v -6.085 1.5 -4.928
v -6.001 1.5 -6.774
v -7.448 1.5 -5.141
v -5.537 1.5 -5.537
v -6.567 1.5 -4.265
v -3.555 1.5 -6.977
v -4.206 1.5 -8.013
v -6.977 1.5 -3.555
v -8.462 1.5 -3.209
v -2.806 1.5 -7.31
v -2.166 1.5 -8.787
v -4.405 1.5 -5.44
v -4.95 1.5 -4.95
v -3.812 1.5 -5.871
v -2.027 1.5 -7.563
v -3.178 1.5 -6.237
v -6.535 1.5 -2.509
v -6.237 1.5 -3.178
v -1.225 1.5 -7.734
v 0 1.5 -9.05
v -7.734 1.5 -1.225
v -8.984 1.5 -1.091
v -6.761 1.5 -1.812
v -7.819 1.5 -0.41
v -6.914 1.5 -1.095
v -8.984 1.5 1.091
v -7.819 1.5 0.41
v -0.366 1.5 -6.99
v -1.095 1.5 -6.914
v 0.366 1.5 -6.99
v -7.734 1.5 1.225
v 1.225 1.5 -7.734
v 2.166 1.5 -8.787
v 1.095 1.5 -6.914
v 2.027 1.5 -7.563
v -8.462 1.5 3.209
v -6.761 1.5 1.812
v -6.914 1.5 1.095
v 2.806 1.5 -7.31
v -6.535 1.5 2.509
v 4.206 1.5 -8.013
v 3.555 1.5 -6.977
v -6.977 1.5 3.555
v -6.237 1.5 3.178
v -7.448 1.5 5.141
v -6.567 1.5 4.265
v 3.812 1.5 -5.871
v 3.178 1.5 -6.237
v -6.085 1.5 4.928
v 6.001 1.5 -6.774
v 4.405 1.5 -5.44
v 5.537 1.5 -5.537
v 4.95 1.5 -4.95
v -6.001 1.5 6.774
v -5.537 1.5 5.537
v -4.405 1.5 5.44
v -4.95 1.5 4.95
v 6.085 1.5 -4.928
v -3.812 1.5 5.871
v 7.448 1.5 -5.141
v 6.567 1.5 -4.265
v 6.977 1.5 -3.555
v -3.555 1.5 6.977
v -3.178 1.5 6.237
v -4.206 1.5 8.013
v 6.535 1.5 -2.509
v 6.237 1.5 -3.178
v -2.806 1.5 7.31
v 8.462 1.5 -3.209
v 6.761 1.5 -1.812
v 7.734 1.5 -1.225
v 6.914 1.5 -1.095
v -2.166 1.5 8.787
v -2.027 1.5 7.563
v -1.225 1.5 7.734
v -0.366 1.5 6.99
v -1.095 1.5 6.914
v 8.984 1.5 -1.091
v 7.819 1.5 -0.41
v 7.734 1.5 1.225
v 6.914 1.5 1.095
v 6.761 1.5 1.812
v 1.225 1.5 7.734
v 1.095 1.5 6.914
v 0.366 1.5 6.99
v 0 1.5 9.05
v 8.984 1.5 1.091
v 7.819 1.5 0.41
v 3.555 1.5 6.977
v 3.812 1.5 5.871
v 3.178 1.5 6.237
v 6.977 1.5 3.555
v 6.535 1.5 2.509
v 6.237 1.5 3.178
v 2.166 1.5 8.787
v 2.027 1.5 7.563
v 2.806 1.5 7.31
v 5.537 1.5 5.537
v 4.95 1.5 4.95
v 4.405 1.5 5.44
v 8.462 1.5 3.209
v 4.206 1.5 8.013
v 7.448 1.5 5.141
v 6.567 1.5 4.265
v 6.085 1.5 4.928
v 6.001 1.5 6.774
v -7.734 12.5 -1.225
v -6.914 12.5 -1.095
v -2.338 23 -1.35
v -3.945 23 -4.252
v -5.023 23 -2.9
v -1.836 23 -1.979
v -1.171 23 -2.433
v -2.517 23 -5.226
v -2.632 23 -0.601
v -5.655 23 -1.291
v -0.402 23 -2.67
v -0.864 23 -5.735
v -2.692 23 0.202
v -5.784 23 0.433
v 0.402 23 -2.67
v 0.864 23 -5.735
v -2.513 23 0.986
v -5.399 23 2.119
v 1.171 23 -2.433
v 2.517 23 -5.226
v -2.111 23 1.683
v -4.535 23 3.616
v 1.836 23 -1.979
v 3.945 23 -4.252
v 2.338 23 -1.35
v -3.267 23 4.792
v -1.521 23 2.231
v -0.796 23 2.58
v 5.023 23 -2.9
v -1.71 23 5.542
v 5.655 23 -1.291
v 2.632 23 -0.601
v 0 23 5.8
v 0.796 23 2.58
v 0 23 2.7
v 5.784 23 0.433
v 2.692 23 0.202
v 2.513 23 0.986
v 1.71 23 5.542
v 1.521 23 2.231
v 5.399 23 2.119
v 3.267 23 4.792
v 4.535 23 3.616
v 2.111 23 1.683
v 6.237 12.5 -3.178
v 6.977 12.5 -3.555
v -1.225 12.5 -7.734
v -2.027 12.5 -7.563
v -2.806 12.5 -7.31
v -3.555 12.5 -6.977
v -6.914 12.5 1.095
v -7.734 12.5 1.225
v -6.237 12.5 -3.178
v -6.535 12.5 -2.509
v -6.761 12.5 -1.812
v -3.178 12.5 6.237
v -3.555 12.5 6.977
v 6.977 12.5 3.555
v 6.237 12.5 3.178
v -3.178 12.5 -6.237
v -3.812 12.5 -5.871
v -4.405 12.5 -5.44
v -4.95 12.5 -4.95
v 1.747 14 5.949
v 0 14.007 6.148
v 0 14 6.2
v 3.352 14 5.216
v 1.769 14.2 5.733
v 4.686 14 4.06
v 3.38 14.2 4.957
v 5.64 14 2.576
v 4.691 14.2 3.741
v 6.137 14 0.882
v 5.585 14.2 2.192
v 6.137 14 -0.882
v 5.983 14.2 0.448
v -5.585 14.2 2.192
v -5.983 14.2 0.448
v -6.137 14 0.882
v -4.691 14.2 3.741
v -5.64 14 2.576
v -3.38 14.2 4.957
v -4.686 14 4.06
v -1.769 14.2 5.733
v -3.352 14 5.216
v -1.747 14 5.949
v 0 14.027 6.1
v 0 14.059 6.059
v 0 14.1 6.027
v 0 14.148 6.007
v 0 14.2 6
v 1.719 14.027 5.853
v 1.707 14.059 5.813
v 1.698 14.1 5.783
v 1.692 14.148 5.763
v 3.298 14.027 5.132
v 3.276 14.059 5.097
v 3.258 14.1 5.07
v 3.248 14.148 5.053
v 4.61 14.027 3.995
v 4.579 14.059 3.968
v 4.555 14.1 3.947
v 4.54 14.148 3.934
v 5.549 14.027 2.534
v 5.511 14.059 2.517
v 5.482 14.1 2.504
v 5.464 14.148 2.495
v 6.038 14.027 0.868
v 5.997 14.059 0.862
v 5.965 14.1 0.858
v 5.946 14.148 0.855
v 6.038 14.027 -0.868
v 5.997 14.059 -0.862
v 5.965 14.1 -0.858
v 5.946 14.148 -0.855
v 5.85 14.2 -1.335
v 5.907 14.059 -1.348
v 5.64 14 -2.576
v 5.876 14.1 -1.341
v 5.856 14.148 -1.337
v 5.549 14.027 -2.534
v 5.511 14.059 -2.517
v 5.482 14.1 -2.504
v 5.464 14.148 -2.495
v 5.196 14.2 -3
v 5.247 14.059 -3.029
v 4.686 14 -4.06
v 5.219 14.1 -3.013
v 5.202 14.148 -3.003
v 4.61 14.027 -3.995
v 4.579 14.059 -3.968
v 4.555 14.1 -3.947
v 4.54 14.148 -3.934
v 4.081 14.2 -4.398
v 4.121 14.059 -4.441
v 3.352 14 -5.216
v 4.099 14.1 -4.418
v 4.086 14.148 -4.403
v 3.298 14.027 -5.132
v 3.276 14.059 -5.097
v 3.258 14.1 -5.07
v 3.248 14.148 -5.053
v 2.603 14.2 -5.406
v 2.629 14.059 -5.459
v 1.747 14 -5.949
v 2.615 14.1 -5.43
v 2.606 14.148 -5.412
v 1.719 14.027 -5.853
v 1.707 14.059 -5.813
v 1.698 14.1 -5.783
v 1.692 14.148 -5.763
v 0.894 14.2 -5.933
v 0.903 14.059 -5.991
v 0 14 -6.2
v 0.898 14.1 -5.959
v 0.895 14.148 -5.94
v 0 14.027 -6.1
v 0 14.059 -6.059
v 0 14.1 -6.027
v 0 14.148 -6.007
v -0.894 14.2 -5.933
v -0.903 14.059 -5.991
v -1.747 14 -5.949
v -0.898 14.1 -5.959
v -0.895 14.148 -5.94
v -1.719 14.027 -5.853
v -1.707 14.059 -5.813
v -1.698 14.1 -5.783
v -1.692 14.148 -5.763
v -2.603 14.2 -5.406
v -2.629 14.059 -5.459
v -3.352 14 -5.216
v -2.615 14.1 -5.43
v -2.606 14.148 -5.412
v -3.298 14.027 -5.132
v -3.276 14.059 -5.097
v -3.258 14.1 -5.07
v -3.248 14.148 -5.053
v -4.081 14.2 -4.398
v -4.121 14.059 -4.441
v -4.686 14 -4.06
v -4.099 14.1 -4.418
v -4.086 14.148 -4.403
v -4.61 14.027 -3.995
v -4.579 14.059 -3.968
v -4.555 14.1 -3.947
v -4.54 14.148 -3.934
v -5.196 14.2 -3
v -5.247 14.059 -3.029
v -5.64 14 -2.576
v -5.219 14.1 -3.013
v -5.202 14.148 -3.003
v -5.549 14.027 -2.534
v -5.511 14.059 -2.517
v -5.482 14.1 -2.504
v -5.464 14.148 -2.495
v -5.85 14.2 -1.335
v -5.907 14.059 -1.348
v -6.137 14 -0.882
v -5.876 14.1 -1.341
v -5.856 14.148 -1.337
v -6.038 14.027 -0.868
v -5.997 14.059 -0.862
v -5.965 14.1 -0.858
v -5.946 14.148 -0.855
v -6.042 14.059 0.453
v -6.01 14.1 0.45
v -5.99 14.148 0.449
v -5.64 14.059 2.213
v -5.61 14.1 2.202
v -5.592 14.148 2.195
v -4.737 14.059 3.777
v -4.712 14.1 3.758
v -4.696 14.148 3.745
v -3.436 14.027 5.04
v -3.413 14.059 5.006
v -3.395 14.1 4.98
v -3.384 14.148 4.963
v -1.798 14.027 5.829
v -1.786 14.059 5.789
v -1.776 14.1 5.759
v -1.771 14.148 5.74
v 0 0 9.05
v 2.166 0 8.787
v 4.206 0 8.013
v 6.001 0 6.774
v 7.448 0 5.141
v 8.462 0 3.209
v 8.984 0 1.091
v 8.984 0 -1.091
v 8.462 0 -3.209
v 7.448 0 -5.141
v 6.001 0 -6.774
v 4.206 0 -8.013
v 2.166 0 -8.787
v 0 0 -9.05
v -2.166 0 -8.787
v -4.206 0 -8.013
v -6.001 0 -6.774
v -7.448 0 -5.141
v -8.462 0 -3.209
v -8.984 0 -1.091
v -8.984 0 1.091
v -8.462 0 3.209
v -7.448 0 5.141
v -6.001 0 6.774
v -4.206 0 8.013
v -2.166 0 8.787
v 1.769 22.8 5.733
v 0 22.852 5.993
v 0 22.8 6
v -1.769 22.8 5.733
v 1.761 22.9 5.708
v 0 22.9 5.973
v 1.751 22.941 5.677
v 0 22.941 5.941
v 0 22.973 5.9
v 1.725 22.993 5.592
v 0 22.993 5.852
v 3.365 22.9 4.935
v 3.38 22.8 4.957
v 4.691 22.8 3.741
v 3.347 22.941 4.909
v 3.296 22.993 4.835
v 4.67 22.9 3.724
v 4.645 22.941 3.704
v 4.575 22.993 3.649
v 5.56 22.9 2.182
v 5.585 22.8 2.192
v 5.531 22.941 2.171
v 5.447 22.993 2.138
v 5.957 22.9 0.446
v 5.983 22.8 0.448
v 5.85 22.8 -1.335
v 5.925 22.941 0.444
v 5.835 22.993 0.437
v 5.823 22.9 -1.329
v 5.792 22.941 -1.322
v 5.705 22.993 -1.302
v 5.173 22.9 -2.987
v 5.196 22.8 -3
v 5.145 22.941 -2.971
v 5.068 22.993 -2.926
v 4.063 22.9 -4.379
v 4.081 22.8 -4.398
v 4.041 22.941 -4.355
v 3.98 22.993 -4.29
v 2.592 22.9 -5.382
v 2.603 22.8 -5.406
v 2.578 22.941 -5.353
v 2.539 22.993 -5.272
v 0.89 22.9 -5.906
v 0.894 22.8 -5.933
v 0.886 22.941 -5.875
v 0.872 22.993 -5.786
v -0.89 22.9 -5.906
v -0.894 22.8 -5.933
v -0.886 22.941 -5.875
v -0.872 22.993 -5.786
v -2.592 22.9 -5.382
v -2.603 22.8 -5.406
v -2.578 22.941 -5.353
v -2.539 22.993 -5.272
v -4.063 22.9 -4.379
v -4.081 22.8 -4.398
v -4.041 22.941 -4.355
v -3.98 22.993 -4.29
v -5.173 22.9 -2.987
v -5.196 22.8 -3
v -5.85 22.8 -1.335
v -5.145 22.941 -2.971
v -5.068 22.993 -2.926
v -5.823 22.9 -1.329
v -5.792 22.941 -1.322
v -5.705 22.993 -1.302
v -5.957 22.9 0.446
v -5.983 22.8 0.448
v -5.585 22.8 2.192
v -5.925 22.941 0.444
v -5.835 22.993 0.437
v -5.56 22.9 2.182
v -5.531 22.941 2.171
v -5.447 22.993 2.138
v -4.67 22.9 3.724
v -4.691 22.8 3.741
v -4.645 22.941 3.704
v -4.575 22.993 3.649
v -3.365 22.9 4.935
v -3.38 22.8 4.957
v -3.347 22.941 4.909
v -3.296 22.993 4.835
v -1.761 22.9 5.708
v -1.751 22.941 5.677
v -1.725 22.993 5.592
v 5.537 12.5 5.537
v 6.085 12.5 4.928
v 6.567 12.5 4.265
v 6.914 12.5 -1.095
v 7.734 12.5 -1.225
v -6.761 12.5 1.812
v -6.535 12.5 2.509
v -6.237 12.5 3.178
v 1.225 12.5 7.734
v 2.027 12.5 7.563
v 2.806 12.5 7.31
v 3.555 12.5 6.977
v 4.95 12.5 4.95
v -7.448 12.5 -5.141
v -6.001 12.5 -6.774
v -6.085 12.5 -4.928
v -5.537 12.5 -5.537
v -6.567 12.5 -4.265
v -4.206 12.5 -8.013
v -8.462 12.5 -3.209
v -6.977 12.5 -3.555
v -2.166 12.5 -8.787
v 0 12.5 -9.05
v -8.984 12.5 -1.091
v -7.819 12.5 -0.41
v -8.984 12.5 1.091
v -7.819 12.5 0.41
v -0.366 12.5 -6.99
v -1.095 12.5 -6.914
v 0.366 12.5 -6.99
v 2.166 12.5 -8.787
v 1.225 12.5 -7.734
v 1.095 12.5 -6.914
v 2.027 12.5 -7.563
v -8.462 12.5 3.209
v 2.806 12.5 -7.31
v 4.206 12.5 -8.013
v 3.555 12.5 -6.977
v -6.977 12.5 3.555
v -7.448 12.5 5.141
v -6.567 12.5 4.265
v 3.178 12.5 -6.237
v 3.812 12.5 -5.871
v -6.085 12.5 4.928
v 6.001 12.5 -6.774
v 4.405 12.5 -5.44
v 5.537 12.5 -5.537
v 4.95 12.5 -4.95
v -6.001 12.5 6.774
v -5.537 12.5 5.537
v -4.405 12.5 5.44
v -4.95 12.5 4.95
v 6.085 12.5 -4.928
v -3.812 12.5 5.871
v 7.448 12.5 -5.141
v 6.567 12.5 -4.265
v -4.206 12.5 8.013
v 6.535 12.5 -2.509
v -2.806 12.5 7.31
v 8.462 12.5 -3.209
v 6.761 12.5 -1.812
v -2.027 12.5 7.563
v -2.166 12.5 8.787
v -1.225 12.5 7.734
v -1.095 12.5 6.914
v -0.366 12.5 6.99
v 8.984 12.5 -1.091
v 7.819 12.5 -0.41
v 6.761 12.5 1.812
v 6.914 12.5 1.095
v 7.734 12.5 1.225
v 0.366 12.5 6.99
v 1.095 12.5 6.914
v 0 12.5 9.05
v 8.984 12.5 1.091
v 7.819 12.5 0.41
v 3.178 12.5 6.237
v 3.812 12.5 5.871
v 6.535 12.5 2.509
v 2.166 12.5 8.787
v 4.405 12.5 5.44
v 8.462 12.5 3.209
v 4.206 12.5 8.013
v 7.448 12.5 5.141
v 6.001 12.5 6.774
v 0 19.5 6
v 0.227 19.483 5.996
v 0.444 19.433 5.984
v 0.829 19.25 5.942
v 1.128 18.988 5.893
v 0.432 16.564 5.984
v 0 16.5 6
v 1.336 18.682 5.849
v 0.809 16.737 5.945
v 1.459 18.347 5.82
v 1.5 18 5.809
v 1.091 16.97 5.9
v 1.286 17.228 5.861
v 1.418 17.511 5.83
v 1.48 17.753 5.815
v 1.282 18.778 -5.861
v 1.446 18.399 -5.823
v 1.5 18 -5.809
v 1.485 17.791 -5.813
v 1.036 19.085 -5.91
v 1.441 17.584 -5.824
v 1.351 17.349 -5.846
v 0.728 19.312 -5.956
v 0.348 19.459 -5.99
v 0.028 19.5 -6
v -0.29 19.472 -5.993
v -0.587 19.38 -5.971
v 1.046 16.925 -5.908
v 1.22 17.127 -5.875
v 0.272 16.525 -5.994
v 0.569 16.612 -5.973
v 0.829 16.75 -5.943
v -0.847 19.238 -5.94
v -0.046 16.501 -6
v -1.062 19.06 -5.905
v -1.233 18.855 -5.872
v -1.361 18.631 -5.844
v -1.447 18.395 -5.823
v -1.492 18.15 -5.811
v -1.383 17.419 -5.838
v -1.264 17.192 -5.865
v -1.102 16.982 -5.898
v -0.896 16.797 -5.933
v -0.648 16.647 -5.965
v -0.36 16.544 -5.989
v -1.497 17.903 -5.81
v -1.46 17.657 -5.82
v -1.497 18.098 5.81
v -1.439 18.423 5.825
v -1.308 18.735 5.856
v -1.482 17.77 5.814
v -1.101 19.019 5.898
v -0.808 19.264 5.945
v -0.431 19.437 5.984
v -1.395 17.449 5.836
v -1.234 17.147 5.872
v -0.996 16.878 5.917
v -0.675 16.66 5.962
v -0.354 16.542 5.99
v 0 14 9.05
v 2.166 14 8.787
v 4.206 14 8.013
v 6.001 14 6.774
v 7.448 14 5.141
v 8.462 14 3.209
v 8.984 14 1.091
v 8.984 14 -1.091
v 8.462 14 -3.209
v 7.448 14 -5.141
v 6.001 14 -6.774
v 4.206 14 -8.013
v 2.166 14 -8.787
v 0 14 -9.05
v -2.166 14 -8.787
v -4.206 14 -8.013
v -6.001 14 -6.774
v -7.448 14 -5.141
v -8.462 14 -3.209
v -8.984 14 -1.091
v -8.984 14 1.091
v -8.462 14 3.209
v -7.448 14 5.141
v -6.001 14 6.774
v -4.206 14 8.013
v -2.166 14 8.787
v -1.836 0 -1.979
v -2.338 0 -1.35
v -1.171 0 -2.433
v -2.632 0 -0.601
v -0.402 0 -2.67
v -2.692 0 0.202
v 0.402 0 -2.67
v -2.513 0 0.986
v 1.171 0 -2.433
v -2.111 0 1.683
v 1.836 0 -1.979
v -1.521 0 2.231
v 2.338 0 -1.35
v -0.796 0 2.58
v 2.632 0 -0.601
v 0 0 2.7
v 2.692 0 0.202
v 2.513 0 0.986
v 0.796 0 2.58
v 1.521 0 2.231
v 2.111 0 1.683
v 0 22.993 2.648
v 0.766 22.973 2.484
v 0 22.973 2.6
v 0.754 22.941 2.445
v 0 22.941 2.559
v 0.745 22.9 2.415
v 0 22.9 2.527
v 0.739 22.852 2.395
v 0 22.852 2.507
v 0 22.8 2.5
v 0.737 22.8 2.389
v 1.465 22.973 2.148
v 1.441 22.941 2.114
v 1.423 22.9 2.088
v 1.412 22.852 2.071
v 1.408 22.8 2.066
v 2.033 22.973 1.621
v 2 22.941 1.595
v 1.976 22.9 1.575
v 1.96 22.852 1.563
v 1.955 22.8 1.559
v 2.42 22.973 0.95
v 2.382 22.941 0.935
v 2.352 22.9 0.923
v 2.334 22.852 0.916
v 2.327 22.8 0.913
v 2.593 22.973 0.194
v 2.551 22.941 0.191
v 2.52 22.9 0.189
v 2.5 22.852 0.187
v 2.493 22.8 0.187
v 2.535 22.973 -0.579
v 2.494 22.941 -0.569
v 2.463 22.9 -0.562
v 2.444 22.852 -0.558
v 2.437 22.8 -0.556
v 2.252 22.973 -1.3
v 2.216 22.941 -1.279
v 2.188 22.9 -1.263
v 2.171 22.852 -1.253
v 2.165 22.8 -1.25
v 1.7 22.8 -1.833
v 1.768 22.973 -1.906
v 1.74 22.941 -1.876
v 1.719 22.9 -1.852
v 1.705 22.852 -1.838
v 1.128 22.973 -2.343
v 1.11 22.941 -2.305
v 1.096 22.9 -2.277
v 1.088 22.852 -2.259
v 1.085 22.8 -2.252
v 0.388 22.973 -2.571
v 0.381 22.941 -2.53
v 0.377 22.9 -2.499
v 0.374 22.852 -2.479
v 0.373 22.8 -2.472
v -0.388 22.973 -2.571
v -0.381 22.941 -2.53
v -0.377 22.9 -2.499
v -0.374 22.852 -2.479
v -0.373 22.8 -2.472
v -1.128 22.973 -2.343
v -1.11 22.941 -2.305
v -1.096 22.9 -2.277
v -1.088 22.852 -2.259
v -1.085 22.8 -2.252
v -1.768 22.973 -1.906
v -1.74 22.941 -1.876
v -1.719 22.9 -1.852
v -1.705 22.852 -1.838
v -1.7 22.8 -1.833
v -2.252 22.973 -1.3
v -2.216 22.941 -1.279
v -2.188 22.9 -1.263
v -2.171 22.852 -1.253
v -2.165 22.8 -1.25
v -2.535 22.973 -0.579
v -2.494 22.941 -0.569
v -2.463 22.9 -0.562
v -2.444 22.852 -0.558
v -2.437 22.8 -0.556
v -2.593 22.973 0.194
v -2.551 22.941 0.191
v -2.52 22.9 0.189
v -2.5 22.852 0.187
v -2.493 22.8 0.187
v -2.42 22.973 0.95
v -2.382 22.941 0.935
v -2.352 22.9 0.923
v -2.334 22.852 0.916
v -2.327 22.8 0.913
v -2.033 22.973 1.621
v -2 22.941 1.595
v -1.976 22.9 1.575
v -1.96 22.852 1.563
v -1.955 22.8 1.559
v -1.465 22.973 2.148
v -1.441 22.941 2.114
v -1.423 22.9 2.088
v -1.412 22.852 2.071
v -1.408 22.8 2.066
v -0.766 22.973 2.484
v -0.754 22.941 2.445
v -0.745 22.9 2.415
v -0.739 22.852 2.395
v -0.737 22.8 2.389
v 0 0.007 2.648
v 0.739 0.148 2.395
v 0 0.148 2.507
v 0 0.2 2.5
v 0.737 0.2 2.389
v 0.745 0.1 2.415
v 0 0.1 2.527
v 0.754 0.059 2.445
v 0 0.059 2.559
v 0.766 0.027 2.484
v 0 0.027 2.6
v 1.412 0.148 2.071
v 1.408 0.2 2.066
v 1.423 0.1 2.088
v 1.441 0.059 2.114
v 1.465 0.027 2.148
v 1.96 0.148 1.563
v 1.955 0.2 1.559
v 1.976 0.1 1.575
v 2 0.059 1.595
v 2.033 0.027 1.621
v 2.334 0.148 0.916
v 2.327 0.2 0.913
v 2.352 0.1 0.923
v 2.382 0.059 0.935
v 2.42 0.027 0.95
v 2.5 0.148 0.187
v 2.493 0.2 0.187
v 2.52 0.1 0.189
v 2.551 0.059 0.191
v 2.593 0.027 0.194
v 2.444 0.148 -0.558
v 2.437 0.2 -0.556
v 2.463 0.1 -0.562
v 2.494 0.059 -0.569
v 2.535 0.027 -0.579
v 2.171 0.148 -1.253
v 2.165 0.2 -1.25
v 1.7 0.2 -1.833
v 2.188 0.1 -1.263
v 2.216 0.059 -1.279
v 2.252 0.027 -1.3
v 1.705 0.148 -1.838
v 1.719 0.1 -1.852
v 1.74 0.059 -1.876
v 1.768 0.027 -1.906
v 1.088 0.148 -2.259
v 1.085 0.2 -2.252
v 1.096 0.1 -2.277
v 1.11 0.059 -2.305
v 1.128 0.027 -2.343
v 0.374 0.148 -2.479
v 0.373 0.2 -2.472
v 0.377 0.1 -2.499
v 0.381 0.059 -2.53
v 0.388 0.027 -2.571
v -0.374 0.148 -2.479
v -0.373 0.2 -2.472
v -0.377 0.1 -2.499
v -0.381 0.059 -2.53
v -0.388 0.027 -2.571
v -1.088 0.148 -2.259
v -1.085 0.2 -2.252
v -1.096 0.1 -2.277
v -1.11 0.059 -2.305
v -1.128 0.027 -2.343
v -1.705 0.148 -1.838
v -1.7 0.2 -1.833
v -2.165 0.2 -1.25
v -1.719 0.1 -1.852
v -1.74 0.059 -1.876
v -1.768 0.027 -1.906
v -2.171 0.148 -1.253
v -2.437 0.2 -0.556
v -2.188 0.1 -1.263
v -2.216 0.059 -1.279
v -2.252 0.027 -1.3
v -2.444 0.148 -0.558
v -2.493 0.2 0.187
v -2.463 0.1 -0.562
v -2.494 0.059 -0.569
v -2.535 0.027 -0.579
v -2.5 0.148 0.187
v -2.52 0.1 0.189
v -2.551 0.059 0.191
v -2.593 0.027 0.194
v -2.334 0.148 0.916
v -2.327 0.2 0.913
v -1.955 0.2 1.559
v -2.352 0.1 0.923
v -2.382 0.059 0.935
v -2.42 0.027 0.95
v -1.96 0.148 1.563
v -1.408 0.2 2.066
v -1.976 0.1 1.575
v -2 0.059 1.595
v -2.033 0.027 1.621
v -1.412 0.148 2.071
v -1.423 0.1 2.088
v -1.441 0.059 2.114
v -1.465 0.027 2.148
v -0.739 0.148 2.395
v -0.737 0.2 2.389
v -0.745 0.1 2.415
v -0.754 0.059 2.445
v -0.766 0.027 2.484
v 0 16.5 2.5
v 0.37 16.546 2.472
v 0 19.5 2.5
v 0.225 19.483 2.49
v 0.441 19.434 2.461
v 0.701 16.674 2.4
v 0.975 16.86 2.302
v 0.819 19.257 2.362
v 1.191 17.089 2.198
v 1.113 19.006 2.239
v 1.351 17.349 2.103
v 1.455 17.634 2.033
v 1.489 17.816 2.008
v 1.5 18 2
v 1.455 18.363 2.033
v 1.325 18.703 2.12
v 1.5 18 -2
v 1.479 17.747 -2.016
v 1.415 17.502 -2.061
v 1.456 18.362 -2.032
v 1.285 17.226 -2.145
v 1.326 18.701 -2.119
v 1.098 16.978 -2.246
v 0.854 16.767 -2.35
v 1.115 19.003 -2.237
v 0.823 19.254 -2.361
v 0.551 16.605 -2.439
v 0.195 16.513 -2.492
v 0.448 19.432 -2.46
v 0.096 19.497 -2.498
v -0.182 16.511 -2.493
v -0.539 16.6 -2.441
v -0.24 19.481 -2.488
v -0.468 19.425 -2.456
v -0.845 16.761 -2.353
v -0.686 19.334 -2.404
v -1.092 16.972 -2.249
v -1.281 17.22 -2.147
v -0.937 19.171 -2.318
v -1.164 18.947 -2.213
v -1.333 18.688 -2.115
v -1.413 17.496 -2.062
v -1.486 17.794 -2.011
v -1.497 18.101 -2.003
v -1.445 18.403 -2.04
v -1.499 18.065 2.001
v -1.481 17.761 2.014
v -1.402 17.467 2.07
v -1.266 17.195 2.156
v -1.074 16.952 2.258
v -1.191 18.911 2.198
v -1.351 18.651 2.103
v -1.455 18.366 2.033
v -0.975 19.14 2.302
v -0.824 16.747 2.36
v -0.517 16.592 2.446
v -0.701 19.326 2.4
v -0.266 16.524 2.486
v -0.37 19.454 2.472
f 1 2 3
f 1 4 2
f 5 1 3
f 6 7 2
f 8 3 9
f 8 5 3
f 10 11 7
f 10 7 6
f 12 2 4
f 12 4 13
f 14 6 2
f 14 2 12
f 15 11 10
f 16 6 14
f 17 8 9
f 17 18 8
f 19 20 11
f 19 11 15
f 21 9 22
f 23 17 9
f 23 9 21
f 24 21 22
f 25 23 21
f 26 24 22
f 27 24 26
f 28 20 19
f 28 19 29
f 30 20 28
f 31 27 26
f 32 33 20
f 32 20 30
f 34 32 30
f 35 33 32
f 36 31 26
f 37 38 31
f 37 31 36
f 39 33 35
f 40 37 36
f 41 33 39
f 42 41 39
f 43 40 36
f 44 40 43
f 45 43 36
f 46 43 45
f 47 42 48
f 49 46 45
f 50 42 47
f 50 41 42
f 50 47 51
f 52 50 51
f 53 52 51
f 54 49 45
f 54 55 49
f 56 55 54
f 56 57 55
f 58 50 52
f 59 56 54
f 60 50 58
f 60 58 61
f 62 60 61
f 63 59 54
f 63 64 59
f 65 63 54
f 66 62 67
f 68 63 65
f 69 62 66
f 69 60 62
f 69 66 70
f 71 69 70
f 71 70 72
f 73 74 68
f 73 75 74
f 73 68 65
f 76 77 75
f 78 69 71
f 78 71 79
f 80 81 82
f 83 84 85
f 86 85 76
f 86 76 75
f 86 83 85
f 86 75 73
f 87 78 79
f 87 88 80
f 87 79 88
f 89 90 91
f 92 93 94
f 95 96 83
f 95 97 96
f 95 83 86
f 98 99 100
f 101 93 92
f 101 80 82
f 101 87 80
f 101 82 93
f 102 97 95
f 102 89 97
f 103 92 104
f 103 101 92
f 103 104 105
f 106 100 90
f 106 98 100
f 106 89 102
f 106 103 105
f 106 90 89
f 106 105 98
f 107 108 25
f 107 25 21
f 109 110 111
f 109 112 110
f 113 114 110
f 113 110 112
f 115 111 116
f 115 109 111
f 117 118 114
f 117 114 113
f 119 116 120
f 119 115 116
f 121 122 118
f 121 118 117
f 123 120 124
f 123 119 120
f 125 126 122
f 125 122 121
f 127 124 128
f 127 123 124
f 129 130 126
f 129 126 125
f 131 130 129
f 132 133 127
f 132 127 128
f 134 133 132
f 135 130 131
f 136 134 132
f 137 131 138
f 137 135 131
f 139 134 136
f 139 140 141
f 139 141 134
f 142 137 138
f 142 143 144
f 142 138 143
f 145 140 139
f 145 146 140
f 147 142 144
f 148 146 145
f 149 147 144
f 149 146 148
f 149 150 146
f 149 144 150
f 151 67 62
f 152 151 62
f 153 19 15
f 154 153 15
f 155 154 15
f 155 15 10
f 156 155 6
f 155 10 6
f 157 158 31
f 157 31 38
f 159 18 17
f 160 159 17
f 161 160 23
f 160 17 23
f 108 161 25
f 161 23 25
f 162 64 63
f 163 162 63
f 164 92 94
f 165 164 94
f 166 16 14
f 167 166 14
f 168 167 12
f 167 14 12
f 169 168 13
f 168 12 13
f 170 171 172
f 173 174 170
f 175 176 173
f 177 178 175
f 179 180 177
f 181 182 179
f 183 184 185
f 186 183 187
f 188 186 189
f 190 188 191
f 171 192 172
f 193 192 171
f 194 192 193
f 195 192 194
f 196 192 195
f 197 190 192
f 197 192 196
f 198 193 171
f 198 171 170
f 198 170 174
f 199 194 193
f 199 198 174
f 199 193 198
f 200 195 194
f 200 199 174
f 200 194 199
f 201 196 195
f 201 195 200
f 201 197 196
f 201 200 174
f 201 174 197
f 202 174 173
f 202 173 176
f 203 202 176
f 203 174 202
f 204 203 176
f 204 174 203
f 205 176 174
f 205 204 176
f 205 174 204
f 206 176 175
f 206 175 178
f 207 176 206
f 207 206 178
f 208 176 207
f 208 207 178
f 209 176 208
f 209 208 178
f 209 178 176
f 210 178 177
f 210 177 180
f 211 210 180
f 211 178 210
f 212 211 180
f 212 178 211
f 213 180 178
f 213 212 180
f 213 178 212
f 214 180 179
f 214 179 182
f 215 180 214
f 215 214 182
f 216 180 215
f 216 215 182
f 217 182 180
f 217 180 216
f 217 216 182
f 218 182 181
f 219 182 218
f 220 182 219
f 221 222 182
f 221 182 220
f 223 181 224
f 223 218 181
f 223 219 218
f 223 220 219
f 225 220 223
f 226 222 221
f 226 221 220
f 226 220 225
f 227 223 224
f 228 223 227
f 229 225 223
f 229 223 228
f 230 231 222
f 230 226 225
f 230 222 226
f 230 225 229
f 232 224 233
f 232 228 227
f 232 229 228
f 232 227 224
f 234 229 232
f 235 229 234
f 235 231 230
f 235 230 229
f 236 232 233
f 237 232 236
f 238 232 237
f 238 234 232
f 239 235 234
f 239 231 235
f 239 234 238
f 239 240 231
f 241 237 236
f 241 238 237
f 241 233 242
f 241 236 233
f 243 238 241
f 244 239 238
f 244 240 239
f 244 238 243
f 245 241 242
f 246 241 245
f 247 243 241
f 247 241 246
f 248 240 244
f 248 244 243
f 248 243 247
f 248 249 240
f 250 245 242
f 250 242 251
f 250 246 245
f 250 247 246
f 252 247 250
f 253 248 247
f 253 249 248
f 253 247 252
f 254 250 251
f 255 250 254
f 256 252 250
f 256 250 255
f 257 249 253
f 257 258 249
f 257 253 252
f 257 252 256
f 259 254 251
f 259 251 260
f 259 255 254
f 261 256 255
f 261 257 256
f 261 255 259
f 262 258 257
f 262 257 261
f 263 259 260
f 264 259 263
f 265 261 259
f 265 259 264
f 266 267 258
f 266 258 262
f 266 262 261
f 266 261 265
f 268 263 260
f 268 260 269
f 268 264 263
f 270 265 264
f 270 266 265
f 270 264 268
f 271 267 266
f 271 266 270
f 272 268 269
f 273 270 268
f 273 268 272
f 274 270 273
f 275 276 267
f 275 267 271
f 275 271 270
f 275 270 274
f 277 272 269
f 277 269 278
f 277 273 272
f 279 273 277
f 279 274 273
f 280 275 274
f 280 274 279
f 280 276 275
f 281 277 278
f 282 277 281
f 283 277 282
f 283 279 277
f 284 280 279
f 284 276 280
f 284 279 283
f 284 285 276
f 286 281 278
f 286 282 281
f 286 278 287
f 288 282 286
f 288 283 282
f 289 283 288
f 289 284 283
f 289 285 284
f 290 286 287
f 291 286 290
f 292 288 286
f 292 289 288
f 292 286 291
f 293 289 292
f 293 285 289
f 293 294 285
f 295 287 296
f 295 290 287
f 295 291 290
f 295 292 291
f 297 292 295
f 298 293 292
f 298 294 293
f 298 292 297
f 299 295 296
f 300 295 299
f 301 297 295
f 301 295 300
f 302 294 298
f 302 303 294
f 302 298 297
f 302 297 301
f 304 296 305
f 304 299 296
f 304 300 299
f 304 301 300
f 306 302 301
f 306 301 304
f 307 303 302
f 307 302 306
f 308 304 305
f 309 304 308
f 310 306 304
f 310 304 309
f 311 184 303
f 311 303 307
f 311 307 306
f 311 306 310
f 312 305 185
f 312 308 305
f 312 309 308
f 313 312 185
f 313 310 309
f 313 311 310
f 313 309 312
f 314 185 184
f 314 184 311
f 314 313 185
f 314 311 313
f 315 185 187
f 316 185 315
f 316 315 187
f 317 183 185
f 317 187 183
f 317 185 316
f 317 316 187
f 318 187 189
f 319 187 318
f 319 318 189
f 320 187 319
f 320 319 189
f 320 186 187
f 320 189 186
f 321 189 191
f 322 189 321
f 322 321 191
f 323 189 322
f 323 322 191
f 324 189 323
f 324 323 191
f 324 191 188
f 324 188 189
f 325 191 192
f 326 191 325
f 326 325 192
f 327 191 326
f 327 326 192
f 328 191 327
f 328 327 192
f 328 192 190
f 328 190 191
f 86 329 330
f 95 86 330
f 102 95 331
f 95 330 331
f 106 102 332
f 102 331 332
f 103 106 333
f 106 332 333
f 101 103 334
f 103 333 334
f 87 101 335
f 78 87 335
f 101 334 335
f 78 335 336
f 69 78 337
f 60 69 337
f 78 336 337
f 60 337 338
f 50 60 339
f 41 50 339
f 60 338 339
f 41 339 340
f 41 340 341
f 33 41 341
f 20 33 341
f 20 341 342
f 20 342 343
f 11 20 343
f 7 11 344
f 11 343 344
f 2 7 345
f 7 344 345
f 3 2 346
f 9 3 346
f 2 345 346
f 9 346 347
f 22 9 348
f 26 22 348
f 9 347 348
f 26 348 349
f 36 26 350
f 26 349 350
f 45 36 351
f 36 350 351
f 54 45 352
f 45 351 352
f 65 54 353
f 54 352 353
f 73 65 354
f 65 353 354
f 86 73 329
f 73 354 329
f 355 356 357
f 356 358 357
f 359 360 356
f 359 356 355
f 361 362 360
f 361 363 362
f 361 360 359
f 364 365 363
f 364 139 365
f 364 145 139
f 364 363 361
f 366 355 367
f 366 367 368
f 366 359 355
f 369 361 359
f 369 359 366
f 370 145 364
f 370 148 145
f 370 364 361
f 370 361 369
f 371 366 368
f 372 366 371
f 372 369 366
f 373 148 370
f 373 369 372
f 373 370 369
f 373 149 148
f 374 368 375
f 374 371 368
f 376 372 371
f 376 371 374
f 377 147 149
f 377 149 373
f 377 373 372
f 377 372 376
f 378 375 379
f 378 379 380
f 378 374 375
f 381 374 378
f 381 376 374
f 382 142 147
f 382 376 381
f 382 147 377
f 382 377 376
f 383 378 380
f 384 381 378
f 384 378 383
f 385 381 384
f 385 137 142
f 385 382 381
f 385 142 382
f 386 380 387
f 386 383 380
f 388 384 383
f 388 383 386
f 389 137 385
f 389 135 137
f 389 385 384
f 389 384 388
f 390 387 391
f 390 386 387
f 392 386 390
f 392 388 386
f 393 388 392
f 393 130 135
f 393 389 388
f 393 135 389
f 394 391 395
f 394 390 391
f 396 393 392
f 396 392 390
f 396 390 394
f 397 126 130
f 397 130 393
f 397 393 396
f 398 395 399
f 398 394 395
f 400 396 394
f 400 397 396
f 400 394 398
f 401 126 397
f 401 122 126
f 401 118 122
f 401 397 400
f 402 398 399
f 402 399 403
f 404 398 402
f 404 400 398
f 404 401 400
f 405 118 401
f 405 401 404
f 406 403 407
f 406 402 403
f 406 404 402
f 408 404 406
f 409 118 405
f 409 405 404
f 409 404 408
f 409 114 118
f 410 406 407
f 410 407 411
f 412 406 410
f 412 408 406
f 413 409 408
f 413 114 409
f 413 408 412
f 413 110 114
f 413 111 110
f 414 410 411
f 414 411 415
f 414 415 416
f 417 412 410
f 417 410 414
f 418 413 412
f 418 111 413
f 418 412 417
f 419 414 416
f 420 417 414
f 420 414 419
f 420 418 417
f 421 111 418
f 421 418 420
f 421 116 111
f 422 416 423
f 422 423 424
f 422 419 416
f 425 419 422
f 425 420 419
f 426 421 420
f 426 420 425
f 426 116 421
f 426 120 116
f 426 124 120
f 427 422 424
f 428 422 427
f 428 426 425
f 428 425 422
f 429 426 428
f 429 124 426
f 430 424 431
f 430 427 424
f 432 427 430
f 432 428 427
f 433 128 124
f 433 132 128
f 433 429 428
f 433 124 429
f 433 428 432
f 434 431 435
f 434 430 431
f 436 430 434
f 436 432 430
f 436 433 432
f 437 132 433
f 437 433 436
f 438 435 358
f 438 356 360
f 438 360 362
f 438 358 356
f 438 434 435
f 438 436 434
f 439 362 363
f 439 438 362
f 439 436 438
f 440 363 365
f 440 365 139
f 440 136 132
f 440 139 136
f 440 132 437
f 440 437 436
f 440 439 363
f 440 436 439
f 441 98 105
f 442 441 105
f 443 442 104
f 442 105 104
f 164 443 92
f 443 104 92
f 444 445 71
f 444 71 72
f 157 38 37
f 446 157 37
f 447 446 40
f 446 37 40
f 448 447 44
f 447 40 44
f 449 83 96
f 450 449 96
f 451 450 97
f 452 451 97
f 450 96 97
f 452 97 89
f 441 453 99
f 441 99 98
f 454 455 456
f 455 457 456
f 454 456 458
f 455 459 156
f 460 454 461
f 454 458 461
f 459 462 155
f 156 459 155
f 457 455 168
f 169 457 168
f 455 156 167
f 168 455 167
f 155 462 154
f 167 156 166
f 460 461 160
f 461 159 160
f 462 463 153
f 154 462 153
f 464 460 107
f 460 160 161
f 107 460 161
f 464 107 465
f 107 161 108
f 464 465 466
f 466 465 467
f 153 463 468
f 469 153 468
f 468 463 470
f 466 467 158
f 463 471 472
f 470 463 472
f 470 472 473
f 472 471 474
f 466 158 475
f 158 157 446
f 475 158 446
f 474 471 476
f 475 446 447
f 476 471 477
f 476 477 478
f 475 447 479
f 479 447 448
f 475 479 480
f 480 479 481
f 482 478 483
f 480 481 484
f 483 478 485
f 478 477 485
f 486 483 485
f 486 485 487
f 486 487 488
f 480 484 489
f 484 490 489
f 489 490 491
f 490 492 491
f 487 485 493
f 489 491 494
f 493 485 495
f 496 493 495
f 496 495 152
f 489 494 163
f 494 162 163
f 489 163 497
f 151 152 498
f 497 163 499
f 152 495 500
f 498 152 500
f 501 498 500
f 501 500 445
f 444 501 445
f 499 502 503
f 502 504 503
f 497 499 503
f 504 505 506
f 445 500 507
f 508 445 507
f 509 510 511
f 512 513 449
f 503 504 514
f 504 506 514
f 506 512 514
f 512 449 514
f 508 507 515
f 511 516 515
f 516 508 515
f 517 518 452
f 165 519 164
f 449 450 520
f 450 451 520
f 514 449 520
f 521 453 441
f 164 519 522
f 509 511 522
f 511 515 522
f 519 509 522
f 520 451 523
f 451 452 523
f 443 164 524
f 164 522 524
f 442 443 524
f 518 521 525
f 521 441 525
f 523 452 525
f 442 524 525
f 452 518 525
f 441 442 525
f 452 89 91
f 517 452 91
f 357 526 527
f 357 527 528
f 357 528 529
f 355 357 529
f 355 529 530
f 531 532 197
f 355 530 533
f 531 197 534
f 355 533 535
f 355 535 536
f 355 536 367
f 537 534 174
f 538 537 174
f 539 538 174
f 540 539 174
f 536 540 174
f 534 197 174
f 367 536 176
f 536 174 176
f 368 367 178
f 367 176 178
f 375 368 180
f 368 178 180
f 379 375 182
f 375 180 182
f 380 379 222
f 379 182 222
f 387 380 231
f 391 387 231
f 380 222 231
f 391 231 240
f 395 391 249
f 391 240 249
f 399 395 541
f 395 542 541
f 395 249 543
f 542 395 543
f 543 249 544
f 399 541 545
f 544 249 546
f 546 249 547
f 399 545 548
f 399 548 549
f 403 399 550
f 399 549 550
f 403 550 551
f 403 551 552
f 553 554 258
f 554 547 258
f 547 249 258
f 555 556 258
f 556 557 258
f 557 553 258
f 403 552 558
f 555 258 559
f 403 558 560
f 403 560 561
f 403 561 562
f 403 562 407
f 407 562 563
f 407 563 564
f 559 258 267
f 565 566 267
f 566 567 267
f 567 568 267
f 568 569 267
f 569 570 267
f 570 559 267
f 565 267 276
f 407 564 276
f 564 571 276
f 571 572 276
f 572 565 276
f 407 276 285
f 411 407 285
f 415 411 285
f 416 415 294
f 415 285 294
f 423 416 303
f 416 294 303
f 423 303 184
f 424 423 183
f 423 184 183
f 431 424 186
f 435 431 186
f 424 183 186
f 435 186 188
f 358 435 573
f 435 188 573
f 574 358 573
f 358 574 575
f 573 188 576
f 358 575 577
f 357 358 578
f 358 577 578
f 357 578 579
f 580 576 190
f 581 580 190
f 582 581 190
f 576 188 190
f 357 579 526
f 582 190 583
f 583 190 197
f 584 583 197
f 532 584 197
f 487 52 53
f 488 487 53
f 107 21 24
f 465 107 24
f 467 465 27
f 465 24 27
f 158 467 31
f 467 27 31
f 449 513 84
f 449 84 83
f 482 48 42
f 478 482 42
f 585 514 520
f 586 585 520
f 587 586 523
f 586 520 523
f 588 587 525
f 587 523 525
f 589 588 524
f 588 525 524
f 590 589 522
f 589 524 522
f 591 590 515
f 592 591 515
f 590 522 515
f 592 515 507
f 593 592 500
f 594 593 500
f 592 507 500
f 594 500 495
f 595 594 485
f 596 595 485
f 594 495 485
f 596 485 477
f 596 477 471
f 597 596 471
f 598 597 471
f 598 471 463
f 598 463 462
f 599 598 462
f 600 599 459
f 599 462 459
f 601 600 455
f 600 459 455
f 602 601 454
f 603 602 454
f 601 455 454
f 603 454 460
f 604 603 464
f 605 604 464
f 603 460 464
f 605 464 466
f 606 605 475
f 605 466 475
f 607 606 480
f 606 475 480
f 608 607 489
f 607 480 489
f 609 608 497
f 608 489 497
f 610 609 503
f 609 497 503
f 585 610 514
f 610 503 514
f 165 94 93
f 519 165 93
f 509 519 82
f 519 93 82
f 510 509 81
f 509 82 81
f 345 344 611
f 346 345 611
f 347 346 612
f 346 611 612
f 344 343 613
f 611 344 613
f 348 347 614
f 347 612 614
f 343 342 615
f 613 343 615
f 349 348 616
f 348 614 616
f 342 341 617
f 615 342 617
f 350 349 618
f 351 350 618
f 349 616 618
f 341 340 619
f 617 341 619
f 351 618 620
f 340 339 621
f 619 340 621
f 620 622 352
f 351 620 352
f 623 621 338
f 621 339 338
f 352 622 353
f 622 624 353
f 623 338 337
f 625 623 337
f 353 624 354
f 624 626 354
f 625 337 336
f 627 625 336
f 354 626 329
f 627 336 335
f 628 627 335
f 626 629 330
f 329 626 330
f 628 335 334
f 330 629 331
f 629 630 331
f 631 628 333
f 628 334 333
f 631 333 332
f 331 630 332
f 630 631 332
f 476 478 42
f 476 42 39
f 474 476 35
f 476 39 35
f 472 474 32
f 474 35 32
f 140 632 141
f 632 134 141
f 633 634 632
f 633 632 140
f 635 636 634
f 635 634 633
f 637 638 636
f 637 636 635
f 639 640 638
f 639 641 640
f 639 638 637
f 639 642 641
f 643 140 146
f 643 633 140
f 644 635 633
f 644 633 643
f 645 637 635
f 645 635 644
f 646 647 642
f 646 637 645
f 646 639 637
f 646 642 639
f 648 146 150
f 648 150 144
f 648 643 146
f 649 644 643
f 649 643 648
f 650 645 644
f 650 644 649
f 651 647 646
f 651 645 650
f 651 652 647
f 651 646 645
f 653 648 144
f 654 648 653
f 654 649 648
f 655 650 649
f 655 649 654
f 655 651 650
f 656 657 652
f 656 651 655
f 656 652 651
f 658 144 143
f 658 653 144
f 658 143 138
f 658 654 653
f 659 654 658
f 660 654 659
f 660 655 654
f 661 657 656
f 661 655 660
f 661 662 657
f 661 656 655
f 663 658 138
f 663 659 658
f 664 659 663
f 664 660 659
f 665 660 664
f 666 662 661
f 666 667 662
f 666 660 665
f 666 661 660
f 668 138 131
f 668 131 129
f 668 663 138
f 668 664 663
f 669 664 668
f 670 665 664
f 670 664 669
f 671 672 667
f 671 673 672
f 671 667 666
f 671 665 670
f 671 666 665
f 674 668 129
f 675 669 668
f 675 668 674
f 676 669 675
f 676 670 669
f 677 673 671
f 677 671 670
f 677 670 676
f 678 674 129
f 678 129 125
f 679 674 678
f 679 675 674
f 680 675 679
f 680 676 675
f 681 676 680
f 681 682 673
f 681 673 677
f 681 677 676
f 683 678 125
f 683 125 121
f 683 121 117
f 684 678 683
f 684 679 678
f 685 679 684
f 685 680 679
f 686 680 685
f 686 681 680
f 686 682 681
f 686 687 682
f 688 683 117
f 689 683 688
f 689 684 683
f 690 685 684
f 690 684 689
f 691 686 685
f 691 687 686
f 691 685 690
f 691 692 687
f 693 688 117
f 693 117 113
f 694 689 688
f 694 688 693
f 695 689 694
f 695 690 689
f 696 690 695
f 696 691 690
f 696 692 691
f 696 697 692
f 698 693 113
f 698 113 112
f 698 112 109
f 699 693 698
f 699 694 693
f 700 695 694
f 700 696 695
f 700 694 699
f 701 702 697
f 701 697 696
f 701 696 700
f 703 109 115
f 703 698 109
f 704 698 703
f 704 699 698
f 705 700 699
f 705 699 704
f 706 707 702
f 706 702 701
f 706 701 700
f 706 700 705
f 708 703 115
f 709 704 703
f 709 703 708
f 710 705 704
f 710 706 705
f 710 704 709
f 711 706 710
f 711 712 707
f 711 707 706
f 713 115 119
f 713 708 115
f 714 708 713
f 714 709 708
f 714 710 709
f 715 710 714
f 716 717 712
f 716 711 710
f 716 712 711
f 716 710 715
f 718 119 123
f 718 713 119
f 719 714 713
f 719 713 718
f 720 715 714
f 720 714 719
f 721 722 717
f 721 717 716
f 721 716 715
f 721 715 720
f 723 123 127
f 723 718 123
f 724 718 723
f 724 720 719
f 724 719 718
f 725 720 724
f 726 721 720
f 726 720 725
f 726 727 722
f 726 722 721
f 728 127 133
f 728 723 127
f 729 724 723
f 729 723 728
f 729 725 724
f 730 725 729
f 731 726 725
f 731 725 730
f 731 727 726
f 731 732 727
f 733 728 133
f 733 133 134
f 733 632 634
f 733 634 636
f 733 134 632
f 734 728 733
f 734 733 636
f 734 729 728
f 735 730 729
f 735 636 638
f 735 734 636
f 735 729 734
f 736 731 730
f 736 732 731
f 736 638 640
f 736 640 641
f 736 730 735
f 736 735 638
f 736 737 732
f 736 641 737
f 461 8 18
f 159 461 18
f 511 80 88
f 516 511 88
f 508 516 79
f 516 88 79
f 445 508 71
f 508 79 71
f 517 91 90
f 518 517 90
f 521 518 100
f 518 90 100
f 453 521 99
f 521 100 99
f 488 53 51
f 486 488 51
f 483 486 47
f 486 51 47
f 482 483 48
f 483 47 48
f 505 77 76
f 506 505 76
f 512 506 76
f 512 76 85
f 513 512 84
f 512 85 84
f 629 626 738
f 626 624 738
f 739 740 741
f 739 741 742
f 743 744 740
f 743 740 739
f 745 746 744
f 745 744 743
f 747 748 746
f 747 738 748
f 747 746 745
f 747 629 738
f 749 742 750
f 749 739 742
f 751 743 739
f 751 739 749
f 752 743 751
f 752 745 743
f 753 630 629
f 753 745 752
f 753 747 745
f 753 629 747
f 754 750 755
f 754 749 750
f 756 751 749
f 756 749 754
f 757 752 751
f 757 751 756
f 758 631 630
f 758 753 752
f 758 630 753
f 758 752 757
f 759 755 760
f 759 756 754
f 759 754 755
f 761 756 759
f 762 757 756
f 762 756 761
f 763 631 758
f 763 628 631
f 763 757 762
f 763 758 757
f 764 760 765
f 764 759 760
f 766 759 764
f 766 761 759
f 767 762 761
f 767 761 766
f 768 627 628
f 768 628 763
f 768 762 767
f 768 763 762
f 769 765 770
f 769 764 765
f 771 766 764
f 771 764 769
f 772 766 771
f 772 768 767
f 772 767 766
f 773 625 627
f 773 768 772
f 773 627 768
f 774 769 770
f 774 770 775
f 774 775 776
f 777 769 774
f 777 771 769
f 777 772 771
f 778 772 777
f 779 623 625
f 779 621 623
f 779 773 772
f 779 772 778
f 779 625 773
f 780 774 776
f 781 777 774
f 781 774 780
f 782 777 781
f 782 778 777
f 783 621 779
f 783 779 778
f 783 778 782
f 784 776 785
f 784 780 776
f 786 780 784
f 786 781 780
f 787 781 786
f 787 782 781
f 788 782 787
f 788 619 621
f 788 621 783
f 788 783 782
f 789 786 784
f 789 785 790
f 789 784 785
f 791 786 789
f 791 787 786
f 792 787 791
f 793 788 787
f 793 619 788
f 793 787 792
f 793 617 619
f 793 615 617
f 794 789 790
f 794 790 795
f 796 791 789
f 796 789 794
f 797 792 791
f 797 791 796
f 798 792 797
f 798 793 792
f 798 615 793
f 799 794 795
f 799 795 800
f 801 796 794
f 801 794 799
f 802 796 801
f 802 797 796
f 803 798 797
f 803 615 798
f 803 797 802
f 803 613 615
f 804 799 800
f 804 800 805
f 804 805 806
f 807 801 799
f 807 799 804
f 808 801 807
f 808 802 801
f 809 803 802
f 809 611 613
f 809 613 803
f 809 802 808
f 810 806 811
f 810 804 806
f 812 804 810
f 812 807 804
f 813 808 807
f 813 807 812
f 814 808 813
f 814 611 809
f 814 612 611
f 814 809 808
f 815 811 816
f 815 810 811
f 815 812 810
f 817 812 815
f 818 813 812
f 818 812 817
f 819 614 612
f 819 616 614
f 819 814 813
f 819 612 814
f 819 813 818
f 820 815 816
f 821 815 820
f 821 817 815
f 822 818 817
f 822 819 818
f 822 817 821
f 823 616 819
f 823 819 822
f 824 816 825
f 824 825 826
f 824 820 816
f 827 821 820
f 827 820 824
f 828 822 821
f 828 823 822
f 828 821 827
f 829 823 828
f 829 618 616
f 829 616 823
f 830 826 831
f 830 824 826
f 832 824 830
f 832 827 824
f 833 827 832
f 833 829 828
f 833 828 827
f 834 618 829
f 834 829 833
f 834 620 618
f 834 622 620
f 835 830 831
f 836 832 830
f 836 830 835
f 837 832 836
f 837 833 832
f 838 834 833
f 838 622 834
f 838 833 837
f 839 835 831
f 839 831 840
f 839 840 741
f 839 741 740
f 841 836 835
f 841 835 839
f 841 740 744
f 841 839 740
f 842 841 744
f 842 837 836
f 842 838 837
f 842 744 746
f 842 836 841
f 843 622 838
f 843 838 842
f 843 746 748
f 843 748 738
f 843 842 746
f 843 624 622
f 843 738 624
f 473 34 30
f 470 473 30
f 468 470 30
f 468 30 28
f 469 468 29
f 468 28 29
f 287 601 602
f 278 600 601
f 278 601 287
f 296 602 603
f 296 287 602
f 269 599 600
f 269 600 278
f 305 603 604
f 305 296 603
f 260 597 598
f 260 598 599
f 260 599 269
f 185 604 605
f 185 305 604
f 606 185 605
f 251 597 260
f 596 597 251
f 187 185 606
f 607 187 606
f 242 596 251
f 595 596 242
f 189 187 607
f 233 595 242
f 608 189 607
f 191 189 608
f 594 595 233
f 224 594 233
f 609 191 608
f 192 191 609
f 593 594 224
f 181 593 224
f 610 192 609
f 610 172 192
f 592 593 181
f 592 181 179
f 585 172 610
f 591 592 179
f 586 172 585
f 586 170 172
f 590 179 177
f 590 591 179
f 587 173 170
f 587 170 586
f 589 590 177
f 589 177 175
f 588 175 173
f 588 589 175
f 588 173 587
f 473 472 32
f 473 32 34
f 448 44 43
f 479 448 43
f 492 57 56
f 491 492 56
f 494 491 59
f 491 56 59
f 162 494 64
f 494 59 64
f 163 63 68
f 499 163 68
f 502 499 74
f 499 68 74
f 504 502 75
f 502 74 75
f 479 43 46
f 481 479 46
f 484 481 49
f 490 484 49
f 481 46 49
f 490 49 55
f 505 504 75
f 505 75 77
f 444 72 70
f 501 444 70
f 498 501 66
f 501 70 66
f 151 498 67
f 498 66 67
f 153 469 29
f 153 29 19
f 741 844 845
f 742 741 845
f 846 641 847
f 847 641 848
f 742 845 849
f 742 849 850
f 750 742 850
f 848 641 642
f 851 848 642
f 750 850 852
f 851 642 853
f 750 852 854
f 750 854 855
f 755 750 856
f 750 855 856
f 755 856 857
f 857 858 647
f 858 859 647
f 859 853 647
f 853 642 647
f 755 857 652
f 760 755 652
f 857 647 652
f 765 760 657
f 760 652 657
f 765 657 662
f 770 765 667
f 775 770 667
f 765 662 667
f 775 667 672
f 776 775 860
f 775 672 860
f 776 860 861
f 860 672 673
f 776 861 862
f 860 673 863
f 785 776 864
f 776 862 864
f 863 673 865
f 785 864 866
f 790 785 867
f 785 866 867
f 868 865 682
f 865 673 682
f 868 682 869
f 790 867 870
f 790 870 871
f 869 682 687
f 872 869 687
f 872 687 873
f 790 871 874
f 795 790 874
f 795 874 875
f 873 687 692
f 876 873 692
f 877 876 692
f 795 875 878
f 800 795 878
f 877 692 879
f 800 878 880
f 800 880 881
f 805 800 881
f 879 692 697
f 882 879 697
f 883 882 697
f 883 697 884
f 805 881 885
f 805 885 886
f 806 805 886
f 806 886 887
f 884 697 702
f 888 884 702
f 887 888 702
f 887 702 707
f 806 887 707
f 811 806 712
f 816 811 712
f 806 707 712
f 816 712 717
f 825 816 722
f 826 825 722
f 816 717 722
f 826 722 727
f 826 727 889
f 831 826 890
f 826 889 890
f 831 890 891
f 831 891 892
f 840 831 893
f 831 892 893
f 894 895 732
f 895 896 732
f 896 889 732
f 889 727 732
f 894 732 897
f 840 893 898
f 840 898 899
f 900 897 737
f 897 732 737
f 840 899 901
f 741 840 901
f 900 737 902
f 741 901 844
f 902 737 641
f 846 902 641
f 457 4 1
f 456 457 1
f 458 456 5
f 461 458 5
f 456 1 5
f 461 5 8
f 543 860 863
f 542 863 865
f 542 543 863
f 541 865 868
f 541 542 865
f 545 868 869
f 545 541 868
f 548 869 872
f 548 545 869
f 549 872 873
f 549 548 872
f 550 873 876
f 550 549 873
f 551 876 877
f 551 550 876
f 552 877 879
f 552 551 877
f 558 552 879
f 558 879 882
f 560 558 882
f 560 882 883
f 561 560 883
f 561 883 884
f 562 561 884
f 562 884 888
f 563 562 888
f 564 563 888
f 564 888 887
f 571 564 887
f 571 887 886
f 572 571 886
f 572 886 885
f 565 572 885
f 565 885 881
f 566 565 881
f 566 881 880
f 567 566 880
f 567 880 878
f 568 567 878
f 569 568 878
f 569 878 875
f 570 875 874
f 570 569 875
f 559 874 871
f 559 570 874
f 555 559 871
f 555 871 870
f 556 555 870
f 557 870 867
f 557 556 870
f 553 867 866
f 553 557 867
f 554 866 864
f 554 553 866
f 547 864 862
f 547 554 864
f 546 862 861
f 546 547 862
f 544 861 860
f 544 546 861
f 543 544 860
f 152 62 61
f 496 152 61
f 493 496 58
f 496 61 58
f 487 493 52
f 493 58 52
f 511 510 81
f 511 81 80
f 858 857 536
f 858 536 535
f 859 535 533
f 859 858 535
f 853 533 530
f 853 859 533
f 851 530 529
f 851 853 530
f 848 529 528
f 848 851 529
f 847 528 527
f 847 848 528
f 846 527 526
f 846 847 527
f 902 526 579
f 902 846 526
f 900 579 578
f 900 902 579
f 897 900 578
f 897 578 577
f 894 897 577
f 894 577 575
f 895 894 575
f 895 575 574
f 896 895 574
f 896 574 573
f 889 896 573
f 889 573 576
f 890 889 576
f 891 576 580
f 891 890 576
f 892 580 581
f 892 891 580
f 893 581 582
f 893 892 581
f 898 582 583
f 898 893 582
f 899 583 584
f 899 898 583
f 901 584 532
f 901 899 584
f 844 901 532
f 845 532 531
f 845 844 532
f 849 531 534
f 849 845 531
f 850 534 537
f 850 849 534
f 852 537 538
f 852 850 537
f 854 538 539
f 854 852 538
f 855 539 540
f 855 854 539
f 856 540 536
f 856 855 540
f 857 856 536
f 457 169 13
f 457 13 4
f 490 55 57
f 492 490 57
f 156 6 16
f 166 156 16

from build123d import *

# Parameters (mm, degrees)
SKETCH1_R               = 9.05
BOSS_EXTRUDE1_DEPTH     = 1.5
SKETCH2_R               = 7.83
BOSS_EXTRUDE2_DEPTH     = 11
CUT_EXTRUDE1_START      = -11
CUT_EXTRUDE1_DEPTH      = 11
SKETCH3_R               = 9.05
BOSS_EXTRUDE3_DEPTH     = 1.5
SKETCH5_R               = 6
BOSS_EXTRUDE4_DEPTH     = 9
SKETCH6_R               = 2.5
CUT_EXTRUDE2_DEPTH      = 27.321189183
CUT_EXTRUDE3_DEPTH      = 27.321189183
CUT_EXTRUDE3_DEPTH_BACK = 27.321189183
SKETCH7_R               = 1.5
FILLET1_R               = 0.2


with BuildPart() as part:
    # Sketch1 → Boss-Extrude1 (new body)
    with BuildSketch(Plane(origin=(0, 0, 0), x_dir=(1, 0, 0), z_dir=(0, 1, 0))):
        with Locations(Location((0, 0, 0), (0, 0, 270))):
            Circle(SKETCH1_R)
    extrude(amount=BOSS_EXTRUDE1_DEPTH)

    # Sketch2 → Boss-Extrude2 (add)
    with BuildSketch(Plane(origin=(0, 1.5, 0), x_dir=(1, 0, 0), z_dir=(0, 1, 0))):
        with Locations(Location((0, 0, 0), (0, 0, 270))):
            Circle(SKETCH2_R)
    extrude(amount=BOSS_EXTRUDE2_DEPTH)

    # Sketch4 → Cut-Extrude1 (cut)
    with BuildSketch(Plane(origin=(0, 12.5, 0), x_dir=(1, 0, 0), z_dir=(0, 1, 0)).offset(CUT_EXTRUDE1_START)):
        with BuildLine():
            Line((-1.095041255, 6.913818384), (-1.224881861, 7.733599707))
            ThreePointArc((-1.224881861, 7.733599707), (0, 7.83), (1.224881861, 7.733599707))
            Line((1.224881861, 7.733599707), (1.095041255, 6.913818384))
            ThreePointArc((1.095041255, 6.913818384), (0, 7), (-1.095041255, 6.913818384))
        make_face()
        with BuildLine():
            Line((3.177933498, 6.237045669), (3.554745613, 6.976581084))
            ThreePointArc((3.554745613, 6.976581084), (4.602358525, 6.334603066), (5.536646097, 5.536646097))
            Line((5.536646097, 5.536646097), (4.949747468, 4.949747468))
            ThreePointArc((4.949747468, 4.949747468), (4.114496766, 5.663118961), (3.177933498, 6.237045669))
        make_face()
        with BuildLine():
            Line((6.237045669, 3.177933498), (6.976581084, 3.554745613))
            ThreePointArc((6.976581084, 3.554745613), (7.446772523, 2.419603066), (7.733599707, 1.224881861))
            Line((7.733599707, 1.224881861), (6.913818384, 1.095041255))
            ThreePointArc((6.913818384, 1.095041255), (6.657395614, 2.163118961), (6.237045669, 3.177933498))
        make_face()
        with BuildLine():
            Line((6.913818384, -1.095041255), (7.733599707, -1.224881861))
            ThreePointArc((7.733599707, -1.224881861), (7.446772523, -2.419603066), (6.976581084, -3.554745613))
            Line((6.976581084, -3.554745613), (6.237045669, -3.177933498))
            ThreePointArc((6.237045669, -3.177933498), (6.657395614, -2.163118961), (6.913818384, -1.095041255))
        make_face()
        with BuildLine():
            Line((4.949747468, -4.949747468), (5.536646097, -5.536646097))
            ThreePointArc((5.536646097, -5.536646097), (4.602358525, -6.334603066), (3.554745613, -6.976581084))
            Line((3.554745613, -6.976581084), (3.177933498, -6.237045669))
            ThreePointArc((3.177933498, -6.237045669), (4.114496766, -5.663118961), (4.949747468, -4.949747468))
        make_face()
        with BuildLine():
            Line((1.095041255, -6.913818384), (1.224881861, -7.733599707))
            ThreePointArc((1.224881861, -7.733599707), (0, -7.83), (-1.224881861, -7.733599707))
            Line((-1.224881861, -7.733599707), (-1.095041255, -6.913818384))
            ThreePointArc((-1.095041255, -6.913818384), (0, -7), (1.095041255, -6.913818384))
        make_face()
        with BuildLine():
            Line((-3.177933498, -6.237045669), (-3.554745613, -6.976581084))
            ThreePointArc((-3.554745613, -6.976581084), (-4.602358525, -6.334603066), (-5.536646097, -5.536646097))
            Line((-5.536646097, -5.536646097), (-4.949747468, -4.949747468))
            ThreePointArc((-4.949747468, -4.949747468), (-4.114496766, -5.663118961), (-3.177933498, -6.237045669))
        make_face()
        with BuildLine():
            Line((-6.237045669, -3.177933498), (-6.976581084, -3.554745613))
            ThreePointArc((-6.976581084, -3.554745613), (-7.446772523, -2.419603066), (-7.733599707, -1.224881861))
            Line((-7.733599707, -1.224881861), (-6.913818384, -1.095041255))
            ThreePointArc((-6.913818384, -1.095041255), (-6.657395614, -2.163118961), (-6.237045669, -3.177933498))
        make_face()
        with BuildLine():
            Line((-6.913818384, 1.095041255), (-7.733599707, 1.224881861))
            ThreePointArc((-7.733599707, 1.224881861), (-7.446772523, 2.419603066), (-6.976581084, 3.554745613))
            Line((-6.976581084, 3.554745613), (-6.237045669, 3.177933498))
            ThreePointArc((-6.237045669, 3.177933498), (-6.657395614, 2.163118961), (-6.913818384, 1.095041255))
        make_face()
        with BuildLine():
            Line((-4.949747468, 4.949747468), (-5.536646097, 5.536646097))
            ThreePointArc((-5.536646097, 5.536646097), (-4.602358525, 6.334603066), (-3.554745613, 6.976581084))
            Line((-3.554745613, 6.976581084), (-3.177933498, 6.237045669))
            ThreePointArc((-3.177933498, 6.237045669), (-4.114496766, 5.663118961), (-4.949747468, 4.949747468))
        make_face()
    extrude(amount=CUT_EXTRUDE1_DEPTH, mode=Mode.SUBTRACT)

    # Sketch3 → Boss-Extrude3 (add)
    with BuildSketch(Plane(origin=(0, 12.5, 0), x_dir=(1, 0, 0), z_dir=(0, 1, 0))):
        with Locations(Location((0, 0, 0), (0, 0, 270))):
            Circle(SKETCH3_R)
    extrude(amount=BOSS_EXTRUDE3_DEPTH)

    # Sketch5 → Boss-Extrude4 (add)
    with BuildSketch(Plane(origin=(0, 14, 0), x_dir=(1, 0, 0), z_dir=(0, 1, 0))):
        with Locations(Location((0, 0, 0), (0, 0, 270))):
            Circle(SKETCH5_R)
    extrude(amount=BOSS_EXTRUDE4_DEPTH)

    # Sketch6 → Cut-Extrude2 (cut, through all)
    with BuildSketch(Plane(origin=(0, 23, 0), x_dir=(1, 0, 0), z_dir=(0, 1, 0))):
        with Locations(Location((0, 0, 0), (0, 0, 270))):
            Circle(SKETCH6_R)
    extrude(amount=-CUT_EXTRUDE2_DEPTH, mode=Mode.SUBTRACT)

    # Sketch7 → Cut-Extrude3 (cut, two sides: drawn at the far end of the back side and taken through both)
    with BuildSketch(Plane.XY.offset(-CUT_EXTRUDE3_DEPTH_BACK)):
        with Locations((0, 18)):
            Circle(SKETCH7_R)
    extrude(amount=CUT_EXTRUDE3_DEPTH + CUT_EXTRUDE3_DEPTH_BACK, mode=Mode.SUBTRACT)

    # Fillet1
    fillet1_edges = [part.edges().sort_by_distance(p)[0] for p in [
        (0, 14, -6),
        (0, 23, -6),
        (0, 0, -2.5),
        (0, 23, -2.5),
    ]]
    fillet(fillet1_edges, radius=FILLET1_R)


solid = part.part
